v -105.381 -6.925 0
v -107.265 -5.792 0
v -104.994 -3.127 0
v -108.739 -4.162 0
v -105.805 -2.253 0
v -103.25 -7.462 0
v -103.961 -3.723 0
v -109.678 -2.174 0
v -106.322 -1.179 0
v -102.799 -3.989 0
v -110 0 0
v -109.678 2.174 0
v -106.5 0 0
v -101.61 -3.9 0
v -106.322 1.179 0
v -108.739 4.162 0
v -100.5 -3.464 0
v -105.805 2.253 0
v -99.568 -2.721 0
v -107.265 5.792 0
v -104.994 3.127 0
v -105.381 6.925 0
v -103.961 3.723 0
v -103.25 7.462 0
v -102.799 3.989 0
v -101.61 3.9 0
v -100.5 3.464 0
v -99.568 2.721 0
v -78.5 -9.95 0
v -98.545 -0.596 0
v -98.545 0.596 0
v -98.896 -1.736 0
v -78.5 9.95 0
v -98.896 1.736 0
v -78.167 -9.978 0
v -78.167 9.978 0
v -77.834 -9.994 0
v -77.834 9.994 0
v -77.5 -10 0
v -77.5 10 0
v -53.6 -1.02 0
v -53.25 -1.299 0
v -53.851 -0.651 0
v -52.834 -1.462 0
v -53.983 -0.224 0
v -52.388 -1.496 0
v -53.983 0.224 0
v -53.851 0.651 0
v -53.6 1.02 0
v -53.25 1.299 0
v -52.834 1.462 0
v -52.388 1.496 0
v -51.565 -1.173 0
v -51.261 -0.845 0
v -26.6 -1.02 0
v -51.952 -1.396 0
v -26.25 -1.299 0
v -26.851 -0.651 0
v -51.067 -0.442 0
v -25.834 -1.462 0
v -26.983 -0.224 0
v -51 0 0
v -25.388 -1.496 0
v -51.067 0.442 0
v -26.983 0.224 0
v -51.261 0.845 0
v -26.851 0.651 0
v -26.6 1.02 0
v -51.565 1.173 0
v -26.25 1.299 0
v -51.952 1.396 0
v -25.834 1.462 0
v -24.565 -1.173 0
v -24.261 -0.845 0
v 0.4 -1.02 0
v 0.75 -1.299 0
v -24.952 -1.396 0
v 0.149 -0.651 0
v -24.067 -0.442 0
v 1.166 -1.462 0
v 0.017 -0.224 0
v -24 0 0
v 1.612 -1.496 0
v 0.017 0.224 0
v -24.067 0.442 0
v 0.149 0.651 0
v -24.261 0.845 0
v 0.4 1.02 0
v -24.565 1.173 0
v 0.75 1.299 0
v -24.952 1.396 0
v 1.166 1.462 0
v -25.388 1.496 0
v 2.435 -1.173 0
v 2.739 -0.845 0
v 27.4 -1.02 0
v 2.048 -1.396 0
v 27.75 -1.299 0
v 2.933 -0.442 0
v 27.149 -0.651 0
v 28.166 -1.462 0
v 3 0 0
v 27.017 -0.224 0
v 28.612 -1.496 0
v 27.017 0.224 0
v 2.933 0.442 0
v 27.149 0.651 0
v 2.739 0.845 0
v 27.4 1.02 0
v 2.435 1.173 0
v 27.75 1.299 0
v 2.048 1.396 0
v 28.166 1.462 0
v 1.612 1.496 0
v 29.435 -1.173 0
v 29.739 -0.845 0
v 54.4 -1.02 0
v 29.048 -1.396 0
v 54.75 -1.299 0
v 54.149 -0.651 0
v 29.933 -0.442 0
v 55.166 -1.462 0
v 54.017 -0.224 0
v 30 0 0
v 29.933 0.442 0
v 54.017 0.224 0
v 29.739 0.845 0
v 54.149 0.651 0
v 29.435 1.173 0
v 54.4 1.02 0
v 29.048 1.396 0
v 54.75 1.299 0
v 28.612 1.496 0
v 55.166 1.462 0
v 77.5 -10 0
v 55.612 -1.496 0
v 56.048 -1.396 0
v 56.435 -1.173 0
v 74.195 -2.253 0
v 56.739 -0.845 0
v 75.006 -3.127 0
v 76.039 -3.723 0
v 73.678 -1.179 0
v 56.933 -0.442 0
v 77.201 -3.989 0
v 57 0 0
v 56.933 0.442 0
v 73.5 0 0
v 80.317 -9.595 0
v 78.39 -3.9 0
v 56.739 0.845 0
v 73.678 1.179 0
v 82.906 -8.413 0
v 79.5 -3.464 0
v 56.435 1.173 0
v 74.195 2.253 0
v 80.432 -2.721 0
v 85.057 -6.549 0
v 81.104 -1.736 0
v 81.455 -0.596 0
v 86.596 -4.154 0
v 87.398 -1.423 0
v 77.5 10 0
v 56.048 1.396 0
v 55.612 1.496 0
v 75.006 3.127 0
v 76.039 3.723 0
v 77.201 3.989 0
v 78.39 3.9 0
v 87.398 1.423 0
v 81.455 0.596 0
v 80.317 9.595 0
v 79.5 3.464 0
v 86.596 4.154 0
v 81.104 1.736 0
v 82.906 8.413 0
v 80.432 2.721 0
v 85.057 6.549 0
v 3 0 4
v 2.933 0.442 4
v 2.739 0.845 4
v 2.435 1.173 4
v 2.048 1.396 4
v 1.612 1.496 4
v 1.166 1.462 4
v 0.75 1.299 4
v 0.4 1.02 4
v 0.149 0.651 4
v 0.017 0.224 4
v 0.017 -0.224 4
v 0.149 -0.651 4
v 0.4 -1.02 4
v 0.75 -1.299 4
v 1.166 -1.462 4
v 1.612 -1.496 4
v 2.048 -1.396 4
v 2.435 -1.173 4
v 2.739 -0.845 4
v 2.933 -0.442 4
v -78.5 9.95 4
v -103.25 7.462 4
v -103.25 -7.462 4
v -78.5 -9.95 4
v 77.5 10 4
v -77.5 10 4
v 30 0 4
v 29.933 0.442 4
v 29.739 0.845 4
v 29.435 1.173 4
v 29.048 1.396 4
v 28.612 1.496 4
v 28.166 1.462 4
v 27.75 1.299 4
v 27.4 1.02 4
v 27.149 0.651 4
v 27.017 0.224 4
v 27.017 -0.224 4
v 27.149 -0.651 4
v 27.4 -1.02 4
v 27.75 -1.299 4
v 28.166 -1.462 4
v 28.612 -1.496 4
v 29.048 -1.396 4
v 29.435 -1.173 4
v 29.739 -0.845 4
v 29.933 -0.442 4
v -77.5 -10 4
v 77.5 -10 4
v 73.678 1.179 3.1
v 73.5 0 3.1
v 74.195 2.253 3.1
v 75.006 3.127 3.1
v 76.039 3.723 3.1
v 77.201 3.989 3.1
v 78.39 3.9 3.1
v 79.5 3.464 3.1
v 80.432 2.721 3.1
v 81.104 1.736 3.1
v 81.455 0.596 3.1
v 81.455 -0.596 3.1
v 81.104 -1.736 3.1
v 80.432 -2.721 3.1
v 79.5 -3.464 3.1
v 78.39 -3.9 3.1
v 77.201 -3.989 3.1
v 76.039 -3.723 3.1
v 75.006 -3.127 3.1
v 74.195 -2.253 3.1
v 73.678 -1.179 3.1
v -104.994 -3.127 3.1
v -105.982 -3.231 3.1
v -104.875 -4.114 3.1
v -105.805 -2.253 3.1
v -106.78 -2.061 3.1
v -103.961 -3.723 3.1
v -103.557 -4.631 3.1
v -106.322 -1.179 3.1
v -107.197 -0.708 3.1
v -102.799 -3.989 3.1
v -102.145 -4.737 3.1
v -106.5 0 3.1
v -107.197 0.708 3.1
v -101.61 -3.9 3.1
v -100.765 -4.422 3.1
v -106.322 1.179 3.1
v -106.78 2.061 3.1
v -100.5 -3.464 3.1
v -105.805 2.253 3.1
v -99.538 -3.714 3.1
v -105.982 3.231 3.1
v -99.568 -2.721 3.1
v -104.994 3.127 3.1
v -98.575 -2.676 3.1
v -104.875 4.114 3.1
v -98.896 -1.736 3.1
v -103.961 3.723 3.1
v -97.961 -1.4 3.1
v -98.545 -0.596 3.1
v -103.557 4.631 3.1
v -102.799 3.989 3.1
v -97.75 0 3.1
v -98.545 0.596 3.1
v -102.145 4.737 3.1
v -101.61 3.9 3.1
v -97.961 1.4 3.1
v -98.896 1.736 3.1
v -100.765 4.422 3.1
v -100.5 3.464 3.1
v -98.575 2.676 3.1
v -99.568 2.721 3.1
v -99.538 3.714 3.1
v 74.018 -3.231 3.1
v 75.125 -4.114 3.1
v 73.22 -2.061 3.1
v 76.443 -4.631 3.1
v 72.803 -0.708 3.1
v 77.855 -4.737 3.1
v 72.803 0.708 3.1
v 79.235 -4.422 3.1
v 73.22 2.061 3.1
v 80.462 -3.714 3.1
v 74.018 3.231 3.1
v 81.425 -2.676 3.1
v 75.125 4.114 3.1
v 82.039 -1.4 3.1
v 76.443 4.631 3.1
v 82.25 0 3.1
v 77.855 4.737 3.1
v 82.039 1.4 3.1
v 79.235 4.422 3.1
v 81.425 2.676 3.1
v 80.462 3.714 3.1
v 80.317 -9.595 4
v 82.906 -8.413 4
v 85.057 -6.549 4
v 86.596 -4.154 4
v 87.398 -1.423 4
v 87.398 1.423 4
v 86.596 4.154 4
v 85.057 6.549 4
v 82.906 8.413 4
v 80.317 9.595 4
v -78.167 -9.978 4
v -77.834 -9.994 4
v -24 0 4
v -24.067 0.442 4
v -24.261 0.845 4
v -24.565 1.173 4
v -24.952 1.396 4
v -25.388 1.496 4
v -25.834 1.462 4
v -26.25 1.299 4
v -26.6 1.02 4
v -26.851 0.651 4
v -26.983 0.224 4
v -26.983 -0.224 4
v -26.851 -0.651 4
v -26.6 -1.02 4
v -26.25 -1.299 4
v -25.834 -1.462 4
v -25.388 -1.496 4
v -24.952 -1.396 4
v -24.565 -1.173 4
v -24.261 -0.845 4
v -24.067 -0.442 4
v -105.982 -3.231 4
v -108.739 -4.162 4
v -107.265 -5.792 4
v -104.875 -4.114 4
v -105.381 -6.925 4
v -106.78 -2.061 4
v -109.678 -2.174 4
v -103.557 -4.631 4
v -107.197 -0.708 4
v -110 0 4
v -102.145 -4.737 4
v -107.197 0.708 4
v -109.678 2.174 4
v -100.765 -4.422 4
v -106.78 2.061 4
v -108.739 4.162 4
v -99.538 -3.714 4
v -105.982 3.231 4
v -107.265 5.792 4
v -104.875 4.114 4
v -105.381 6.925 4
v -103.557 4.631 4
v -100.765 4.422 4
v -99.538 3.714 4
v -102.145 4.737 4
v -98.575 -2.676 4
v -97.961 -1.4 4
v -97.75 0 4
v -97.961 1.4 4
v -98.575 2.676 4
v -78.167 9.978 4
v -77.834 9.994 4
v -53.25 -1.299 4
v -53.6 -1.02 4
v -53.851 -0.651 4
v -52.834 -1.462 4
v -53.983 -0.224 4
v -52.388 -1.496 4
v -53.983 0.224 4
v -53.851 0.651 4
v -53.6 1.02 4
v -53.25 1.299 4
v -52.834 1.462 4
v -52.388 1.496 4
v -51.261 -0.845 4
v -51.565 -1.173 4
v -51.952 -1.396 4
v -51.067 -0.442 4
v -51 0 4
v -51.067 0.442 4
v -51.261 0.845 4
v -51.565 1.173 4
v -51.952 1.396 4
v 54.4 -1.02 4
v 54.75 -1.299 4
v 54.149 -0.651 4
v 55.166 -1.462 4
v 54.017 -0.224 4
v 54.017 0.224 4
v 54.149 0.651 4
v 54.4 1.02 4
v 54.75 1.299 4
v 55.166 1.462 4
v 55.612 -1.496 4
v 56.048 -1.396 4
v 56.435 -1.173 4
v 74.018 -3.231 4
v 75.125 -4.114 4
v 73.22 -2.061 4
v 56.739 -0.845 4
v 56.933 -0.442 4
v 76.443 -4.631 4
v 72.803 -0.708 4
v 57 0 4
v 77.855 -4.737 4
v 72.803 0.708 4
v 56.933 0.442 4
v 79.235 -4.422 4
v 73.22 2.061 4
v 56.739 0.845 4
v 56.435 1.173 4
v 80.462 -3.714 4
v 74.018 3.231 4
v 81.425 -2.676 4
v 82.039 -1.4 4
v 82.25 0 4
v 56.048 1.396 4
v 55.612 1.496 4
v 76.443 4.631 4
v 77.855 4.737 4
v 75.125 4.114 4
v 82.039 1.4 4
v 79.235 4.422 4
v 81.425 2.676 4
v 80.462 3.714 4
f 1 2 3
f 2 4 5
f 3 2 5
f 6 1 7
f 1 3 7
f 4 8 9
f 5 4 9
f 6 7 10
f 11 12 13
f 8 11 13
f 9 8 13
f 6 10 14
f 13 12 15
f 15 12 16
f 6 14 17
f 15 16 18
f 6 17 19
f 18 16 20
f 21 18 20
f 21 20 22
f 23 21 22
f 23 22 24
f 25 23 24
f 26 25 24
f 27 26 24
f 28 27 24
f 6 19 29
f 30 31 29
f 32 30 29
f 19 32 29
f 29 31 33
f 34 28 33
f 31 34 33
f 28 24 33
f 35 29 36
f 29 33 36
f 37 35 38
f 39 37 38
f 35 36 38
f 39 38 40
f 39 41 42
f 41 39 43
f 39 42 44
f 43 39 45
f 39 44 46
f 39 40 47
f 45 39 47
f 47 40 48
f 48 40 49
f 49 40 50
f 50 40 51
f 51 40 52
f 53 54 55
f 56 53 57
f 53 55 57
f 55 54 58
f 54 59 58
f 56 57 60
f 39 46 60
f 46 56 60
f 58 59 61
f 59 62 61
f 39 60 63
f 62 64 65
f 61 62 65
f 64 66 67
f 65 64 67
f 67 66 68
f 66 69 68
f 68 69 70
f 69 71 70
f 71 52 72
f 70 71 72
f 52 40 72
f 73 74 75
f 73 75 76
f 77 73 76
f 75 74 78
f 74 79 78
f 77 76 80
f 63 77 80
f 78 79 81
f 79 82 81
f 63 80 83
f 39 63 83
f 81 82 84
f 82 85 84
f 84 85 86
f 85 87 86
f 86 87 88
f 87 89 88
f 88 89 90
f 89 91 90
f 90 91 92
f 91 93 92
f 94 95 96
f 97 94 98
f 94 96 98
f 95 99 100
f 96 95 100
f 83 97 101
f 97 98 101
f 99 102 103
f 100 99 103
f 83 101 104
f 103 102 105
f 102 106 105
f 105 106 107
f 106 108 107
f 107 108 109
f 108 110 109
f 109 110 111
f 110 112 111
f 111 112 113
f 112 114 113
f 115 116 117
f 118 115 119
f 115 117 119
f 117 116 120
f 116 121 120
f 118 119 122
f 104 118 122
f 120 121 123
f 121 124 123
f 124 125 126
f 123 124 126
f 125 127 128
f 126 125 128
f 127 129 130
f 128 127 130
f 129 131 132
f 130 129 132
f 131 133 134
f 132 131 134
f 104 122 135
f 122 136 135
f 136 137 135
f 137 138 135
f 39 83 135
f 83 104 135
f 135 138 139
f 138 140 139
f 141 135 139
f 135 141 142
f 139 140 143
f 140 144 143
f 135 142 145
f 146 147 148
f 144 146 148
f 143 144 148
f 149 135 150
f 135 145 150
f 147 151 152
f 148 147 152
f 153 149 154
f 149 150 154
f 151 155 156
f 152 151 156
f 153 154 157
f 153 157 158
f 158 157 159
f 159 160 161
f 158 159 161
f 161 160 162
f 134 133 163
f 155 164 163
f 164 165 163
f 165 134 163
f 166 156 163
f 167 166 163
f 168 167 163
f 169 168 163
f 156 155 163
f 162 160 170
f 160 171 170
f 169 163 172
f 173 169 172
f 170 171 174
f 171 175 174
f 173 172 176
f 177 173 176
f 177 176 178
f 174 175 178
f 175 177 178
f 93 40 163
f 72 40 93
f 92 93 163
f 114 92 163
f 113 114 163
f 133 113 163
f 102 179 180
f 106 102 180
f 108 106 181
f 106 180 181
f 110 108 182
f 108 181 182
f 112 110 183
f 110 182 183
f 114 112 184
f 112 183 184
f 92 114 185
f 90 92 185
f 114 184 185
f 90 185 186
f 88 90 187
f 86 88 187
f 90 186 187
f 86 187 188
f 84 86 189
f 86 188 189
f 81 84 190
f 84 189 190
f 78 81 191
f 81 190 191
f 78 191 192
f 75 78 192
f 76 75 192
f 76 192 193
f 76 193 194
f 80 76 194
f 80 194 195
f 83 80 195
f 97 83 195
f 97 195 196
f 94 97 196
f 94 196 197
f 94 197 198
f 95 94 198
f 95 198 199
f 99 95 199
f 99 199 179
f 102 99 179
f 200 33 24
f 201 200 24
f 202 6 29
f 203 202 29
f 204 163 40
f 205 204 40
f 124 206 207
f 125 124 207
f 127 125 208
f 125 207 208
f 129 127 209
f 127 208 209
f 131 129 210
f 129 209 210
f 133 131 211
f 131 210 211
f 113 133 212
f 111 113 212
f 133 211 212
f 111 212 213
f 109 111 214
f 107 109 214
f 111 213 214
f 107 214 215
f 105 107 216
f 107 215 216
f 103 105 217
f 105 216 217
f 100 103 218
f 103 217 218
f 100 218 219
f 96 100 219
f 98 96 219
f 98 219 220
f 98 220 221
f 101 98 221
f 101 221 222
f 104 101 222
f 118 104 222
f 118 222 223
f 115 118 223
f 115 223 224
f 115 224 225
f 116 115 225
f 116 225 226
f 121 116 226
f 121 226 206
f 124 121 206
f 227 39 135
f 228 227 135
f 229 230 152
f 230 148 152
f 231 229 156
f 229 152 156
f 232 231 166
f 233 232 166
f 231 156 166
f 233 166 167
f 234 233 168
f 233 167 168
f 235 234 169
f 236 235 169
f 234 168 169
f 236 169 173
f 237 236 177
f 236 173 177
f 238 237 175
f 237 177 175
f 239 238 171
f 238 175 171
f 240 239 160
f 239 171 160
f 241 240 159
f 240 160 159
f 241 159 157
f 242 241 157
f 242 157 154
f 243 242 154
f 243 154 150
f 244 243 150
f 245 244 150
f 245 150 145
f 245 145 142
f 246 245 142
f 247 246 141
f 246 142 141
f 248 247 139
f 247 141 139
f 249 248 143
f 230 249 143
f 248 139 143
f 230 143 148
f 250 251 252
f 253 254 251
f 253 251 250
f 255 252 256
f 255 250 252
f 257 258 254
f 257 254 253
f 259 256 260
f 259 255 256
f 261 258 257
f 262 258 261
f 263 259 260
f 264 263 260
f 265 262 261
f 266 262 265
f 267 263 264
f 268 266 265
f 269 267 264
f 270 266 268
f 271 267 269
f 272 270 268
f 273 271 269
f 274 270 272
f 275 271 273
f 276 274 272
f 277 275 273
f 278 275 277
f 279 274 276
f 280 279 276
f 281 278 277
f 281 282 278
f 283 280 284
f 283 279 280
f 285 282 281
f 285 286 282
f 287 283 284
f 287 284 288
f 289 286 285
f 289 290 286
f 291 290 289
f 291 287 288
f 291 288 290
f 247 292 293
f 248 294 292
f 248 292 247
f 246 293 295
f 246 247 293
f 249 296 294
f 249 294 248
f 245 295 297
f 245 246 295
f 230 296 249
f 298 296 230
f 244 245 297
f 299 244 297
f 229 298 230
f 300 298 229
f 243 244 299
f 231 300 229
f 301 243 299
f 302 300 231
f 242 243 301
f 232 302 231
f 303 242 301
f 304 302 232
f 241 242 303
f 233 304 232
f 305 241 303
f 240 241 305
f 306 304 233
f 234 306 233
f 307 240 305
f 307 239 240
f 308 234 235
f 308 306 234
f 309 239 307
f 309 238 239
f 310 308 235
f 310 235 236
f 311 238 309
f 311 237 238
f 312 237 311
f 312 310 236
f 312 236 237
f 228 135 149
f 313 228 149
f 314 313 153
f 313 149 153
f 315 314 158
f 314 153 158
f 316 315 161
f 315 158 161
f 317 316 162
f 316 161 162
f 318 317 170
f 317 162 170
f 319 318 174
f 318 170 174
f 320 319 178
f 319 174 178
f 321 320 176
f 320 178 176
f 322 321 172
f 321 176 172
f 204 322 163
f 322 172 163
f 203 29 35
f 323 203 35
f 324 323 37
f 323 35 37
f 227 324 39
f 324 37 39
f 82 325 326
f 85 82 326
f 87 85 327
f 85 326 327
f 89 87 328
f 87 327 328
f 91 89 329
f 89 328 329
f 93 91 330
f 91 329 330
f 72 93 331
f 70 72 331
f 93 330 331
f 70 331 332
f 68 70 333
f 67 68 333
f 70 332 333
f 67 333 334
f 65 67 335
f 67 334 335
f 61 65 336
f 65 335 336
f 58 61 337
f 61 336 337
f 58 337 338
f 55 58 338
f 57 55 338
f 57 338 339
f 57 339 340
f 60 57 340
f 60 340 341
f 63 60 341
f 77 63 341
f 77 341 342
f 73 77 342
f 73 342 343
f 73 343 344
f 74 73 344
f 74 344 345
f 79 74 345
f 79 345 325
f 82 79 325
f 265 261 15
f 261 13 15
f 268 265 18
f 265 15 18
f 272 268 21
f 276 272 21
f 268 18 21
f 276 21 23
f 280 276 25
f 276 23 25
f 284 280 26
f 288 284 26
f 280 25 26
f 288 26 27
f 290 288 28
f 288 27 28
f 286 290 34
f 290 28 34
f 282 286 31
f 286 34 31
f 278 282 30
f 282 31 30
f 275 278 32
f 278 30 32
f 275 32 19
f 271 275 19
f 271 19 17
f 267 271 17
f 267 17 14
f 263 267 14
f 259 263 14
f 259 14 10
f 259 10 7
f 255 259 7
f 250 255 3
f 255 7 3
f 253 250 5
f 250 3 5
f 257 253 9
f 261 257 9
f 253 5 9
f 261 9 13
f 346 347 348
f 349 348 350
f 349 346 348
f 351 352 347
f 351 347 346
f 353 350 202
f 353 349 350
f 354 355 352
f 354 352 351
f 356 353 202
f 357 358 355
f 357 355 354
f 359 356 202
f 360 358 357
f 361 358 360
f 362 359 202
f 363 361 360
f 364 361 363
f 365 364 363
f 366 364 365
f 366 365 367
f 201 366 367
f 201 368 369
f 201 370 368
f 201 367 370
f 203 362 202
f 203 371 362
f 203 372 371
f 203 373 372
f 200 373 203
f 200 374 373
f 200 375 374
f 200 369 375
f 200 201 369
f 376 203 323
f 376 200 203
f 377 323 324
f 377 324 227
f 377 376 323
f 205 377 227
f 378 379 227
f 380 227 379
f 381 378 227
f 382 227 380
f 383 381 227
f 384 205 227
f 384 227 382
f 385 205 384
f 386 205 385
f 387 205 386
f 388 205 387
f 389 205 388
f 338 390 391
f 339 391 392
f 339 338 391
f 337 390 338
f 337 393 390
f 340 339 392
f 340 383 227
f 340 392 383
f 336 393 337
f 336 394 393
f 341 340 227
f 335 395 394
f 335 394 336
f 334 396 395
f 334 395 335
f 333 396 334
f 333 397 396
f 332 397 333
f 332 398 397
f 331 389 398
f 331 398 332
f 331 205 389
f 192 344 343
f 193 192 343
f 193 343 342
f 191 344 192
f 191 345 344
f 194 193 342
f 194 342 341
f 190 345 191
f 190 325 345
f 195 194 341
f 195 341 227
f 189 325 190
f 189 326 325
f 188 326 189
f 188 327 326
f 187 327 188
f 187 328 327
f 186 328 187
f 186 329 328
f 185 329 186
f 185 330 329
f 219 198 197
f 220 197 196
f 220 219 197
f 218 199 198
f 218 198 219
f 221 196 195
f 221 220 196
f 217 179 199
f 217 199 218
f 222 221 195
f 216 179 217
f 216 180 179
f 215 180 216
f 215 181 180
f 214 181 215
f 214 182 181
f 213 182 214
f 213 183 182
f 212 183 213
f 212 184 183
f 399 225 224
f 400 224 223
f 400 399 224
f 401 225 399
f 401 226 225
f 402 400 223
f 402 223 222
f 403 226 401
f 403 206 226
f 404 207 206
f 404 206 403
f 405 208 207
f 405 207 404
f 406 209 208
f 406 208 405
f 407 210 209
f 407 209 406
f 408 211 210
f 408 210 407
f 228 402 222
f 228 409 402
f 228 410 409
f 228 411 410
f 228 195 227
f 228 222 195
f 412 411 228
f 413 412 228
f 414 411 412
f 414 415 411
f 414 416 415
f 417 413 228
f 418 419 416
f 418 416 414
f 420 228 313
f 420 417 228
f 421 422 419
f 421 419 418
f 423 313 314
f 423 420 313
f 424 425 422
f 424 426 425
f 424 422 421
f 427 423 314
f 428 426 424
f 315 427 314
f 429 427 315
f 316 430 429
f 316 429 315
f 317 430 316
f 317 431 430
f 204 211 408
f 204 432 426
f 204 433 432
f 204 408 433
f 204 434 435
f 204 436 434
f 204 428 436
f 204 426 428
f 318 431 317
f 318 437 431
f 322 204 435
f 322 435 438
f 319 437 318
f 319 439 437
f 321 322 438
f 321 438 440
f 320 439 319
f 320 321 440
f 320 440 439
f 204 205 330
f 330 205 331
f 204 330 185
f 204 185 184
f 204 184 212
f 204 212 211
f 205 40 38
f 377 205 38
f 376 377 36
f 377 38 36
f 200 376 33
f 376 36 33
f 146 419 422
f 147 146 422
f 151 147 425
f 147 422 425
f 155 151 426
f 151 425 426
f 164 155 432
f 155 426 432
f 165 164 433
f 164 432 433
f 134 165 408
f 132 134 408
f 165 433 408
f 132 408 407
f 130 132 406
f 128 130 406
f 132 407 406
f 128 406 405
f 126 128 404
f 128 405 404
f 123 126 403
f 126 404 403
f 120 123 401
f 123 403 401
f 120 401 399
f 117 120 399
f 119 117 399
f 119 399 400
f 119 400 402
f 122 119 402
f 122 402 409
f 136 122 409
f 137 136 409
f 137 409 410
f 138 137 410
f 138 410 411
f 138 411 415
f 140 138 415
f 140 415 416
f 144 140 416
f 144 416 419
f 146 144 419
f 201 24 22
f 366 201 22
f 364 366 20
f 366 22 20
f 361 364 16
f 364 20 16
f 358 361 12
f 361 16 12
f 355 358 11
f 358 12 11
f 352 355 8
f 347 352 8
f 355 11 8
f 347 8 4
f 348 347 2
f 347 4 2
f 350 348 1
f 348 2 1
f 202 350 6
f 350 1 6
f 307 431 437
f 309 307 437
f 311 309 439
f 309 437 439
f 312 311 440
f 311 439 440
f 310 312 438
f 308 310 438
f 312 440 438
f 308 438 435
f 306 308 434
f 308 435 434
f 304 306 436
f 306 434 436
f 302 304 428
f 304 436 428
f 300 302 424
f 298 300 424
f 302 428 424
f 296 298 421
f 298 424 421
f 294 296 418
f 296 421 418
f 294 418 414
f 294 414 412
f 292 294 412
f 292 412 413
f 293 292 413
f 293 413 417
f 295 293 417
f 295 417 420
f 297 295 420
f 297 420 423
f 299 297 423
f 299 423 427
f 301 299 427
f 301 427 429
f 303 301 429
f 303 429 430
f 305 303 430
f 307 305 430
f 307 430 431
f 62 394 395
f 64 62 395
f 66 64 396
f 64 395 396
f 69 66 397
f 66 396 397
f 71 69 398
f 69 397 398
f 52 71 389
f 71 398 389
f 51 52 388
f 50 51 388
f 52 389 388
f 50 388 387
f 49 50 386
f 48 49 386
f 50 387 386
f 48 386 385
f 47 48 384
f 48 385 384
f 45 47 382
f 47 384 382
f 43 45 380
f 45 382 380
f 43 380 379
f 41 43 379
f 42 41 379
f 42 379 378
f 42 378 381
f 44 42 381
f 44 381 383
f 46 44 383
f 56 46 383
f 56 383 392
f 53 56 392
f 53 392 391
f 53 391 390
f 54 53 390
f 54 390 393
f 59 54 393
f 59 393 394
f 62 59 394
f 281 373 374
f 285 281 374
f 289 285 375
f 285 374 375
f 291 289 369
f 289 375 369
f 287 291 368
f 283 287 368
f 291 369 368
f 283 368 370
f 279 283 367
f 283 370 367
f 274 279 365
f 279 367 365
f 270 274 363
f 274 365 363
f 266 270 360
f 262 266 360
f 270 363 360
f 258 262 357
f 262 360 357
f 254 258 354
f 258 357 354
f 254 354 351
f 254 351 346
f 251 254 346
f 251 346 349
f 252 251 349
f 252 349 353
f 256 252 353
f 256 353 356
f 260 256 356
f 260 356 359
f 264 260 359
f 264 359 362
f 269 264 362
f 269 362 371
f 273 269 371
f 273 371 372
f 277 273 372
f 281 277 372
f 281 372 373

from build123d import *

# Parameters (mm, degrees)
EXTRUDE_1_DEPTH              = 4
HOLE_WIZARD_M5_1_D           = 8
HOLE_WIZARD_M5_1_CBORE_D     = 9.5
HOLE_WIZARD_M5_1_CBORE_DEPTH = 0.9
SKETCH_11_R                  = 1.5
CUT_EXTRUDE_1_DEPTH          = 1
CUT_EXTRUDE_1_DEPTH_BACK     = 5


with BuildPart() as part:
    # 草图1 → 凸台-拉伸1 (new body)
    with BuildSketch(Plane.XY):
        with BuildLine():
            Line((77.5, 10), (-77.5, 10))
            ThreePointArc((-77.5, 10), (-70.428932188, 7.071067812), (-67.5, 0))
            ThreePointArc((-67.5, 0), (-70.428932188, -7.071067812), (-77.5, -10))
            Line((-77.5, -10), (77.5, -10))
            ThreePointArc((77.5, -10), (87.5, 0), (77.5, 10))
        make_face()
        with BuildLine():
            ThreePointArc((-67.5, 0), (-70.428932188, 7.071067812), (-77.5, 10))
            ThreePointArc((-77.5, 10), (-78.000627751, 9.987460731), (-78.5, 9.949874371))
            ThreePointArc((-78.5, 9.949874371), (-87.5, 0), (-78.5, -9.949874371))
            ThreePointArc((-78.5, -9.949874371), (-78.000627751, -9.987460731), (-77.5, -10))
            ThreePointArc((-77.5, -10), (-70.428932188, -7.071067812), (-67.5, 0))
        make_face()
        with BuildLine():
            ThreePointArc((-78.5, -9.949874371), (-87.5, 0), (-78.5, 9.949874371))
            Line((-78.5, 9.949874371), (-103.25, 7.462405778))
            ThreePointArc((-103.25, 7.462405778), (-110, 0), (-103.25, -7.462405778))
            Line((-103.25, -7.462405778), (-78.5, -9.949874371))
        make_face()
    extrude(amount=EXTRUDE_1_DEPTH)

    # M5 六角头螺栓的柱形沉头孔1 (through all)
    with Locations(Plane.XY.offset(4)):
        with Locations((-102.5, 0), (77.5, 0)):
            CounterBoreHole(HOLE_WIZARD_M5_1_D / 2, HOLE_WIZARD_M5_1_CBORE_D / 2, HOLE_WIZARD_M5_1_CBORE_DEPTH)

    # 草图11 → 切除-拉伸1 (cut, two sides)
    with BuildSketch(Plane.XY.offset(4)) as cut_extrude_1_sk:
        with Locations((-52.5, 0)):
            Circle(SKETCH_11_R)
        with Locations((-25.5, 0)):
            Circle(SKETCH_11_R)
        with Locations((1.5, 0)):
            Circle(SKETCH_11_R)
        with Locations((28.5, 0)):
            Circle(SKETCH_11_R)
        with Locations((55.5, 0)):
            Circle(SKETCH_11_R)
    extrude(amount=CUT_EXTRUDE_1_DEPTH, mode=Mode.SUBTRACT)
    extrude(cut_extrude_1_sk.sketch, amount=-CUT_EXTRUDE_1_DEPTH_BACK, mode=Mode.SUBTRACT)


solid = part.part
